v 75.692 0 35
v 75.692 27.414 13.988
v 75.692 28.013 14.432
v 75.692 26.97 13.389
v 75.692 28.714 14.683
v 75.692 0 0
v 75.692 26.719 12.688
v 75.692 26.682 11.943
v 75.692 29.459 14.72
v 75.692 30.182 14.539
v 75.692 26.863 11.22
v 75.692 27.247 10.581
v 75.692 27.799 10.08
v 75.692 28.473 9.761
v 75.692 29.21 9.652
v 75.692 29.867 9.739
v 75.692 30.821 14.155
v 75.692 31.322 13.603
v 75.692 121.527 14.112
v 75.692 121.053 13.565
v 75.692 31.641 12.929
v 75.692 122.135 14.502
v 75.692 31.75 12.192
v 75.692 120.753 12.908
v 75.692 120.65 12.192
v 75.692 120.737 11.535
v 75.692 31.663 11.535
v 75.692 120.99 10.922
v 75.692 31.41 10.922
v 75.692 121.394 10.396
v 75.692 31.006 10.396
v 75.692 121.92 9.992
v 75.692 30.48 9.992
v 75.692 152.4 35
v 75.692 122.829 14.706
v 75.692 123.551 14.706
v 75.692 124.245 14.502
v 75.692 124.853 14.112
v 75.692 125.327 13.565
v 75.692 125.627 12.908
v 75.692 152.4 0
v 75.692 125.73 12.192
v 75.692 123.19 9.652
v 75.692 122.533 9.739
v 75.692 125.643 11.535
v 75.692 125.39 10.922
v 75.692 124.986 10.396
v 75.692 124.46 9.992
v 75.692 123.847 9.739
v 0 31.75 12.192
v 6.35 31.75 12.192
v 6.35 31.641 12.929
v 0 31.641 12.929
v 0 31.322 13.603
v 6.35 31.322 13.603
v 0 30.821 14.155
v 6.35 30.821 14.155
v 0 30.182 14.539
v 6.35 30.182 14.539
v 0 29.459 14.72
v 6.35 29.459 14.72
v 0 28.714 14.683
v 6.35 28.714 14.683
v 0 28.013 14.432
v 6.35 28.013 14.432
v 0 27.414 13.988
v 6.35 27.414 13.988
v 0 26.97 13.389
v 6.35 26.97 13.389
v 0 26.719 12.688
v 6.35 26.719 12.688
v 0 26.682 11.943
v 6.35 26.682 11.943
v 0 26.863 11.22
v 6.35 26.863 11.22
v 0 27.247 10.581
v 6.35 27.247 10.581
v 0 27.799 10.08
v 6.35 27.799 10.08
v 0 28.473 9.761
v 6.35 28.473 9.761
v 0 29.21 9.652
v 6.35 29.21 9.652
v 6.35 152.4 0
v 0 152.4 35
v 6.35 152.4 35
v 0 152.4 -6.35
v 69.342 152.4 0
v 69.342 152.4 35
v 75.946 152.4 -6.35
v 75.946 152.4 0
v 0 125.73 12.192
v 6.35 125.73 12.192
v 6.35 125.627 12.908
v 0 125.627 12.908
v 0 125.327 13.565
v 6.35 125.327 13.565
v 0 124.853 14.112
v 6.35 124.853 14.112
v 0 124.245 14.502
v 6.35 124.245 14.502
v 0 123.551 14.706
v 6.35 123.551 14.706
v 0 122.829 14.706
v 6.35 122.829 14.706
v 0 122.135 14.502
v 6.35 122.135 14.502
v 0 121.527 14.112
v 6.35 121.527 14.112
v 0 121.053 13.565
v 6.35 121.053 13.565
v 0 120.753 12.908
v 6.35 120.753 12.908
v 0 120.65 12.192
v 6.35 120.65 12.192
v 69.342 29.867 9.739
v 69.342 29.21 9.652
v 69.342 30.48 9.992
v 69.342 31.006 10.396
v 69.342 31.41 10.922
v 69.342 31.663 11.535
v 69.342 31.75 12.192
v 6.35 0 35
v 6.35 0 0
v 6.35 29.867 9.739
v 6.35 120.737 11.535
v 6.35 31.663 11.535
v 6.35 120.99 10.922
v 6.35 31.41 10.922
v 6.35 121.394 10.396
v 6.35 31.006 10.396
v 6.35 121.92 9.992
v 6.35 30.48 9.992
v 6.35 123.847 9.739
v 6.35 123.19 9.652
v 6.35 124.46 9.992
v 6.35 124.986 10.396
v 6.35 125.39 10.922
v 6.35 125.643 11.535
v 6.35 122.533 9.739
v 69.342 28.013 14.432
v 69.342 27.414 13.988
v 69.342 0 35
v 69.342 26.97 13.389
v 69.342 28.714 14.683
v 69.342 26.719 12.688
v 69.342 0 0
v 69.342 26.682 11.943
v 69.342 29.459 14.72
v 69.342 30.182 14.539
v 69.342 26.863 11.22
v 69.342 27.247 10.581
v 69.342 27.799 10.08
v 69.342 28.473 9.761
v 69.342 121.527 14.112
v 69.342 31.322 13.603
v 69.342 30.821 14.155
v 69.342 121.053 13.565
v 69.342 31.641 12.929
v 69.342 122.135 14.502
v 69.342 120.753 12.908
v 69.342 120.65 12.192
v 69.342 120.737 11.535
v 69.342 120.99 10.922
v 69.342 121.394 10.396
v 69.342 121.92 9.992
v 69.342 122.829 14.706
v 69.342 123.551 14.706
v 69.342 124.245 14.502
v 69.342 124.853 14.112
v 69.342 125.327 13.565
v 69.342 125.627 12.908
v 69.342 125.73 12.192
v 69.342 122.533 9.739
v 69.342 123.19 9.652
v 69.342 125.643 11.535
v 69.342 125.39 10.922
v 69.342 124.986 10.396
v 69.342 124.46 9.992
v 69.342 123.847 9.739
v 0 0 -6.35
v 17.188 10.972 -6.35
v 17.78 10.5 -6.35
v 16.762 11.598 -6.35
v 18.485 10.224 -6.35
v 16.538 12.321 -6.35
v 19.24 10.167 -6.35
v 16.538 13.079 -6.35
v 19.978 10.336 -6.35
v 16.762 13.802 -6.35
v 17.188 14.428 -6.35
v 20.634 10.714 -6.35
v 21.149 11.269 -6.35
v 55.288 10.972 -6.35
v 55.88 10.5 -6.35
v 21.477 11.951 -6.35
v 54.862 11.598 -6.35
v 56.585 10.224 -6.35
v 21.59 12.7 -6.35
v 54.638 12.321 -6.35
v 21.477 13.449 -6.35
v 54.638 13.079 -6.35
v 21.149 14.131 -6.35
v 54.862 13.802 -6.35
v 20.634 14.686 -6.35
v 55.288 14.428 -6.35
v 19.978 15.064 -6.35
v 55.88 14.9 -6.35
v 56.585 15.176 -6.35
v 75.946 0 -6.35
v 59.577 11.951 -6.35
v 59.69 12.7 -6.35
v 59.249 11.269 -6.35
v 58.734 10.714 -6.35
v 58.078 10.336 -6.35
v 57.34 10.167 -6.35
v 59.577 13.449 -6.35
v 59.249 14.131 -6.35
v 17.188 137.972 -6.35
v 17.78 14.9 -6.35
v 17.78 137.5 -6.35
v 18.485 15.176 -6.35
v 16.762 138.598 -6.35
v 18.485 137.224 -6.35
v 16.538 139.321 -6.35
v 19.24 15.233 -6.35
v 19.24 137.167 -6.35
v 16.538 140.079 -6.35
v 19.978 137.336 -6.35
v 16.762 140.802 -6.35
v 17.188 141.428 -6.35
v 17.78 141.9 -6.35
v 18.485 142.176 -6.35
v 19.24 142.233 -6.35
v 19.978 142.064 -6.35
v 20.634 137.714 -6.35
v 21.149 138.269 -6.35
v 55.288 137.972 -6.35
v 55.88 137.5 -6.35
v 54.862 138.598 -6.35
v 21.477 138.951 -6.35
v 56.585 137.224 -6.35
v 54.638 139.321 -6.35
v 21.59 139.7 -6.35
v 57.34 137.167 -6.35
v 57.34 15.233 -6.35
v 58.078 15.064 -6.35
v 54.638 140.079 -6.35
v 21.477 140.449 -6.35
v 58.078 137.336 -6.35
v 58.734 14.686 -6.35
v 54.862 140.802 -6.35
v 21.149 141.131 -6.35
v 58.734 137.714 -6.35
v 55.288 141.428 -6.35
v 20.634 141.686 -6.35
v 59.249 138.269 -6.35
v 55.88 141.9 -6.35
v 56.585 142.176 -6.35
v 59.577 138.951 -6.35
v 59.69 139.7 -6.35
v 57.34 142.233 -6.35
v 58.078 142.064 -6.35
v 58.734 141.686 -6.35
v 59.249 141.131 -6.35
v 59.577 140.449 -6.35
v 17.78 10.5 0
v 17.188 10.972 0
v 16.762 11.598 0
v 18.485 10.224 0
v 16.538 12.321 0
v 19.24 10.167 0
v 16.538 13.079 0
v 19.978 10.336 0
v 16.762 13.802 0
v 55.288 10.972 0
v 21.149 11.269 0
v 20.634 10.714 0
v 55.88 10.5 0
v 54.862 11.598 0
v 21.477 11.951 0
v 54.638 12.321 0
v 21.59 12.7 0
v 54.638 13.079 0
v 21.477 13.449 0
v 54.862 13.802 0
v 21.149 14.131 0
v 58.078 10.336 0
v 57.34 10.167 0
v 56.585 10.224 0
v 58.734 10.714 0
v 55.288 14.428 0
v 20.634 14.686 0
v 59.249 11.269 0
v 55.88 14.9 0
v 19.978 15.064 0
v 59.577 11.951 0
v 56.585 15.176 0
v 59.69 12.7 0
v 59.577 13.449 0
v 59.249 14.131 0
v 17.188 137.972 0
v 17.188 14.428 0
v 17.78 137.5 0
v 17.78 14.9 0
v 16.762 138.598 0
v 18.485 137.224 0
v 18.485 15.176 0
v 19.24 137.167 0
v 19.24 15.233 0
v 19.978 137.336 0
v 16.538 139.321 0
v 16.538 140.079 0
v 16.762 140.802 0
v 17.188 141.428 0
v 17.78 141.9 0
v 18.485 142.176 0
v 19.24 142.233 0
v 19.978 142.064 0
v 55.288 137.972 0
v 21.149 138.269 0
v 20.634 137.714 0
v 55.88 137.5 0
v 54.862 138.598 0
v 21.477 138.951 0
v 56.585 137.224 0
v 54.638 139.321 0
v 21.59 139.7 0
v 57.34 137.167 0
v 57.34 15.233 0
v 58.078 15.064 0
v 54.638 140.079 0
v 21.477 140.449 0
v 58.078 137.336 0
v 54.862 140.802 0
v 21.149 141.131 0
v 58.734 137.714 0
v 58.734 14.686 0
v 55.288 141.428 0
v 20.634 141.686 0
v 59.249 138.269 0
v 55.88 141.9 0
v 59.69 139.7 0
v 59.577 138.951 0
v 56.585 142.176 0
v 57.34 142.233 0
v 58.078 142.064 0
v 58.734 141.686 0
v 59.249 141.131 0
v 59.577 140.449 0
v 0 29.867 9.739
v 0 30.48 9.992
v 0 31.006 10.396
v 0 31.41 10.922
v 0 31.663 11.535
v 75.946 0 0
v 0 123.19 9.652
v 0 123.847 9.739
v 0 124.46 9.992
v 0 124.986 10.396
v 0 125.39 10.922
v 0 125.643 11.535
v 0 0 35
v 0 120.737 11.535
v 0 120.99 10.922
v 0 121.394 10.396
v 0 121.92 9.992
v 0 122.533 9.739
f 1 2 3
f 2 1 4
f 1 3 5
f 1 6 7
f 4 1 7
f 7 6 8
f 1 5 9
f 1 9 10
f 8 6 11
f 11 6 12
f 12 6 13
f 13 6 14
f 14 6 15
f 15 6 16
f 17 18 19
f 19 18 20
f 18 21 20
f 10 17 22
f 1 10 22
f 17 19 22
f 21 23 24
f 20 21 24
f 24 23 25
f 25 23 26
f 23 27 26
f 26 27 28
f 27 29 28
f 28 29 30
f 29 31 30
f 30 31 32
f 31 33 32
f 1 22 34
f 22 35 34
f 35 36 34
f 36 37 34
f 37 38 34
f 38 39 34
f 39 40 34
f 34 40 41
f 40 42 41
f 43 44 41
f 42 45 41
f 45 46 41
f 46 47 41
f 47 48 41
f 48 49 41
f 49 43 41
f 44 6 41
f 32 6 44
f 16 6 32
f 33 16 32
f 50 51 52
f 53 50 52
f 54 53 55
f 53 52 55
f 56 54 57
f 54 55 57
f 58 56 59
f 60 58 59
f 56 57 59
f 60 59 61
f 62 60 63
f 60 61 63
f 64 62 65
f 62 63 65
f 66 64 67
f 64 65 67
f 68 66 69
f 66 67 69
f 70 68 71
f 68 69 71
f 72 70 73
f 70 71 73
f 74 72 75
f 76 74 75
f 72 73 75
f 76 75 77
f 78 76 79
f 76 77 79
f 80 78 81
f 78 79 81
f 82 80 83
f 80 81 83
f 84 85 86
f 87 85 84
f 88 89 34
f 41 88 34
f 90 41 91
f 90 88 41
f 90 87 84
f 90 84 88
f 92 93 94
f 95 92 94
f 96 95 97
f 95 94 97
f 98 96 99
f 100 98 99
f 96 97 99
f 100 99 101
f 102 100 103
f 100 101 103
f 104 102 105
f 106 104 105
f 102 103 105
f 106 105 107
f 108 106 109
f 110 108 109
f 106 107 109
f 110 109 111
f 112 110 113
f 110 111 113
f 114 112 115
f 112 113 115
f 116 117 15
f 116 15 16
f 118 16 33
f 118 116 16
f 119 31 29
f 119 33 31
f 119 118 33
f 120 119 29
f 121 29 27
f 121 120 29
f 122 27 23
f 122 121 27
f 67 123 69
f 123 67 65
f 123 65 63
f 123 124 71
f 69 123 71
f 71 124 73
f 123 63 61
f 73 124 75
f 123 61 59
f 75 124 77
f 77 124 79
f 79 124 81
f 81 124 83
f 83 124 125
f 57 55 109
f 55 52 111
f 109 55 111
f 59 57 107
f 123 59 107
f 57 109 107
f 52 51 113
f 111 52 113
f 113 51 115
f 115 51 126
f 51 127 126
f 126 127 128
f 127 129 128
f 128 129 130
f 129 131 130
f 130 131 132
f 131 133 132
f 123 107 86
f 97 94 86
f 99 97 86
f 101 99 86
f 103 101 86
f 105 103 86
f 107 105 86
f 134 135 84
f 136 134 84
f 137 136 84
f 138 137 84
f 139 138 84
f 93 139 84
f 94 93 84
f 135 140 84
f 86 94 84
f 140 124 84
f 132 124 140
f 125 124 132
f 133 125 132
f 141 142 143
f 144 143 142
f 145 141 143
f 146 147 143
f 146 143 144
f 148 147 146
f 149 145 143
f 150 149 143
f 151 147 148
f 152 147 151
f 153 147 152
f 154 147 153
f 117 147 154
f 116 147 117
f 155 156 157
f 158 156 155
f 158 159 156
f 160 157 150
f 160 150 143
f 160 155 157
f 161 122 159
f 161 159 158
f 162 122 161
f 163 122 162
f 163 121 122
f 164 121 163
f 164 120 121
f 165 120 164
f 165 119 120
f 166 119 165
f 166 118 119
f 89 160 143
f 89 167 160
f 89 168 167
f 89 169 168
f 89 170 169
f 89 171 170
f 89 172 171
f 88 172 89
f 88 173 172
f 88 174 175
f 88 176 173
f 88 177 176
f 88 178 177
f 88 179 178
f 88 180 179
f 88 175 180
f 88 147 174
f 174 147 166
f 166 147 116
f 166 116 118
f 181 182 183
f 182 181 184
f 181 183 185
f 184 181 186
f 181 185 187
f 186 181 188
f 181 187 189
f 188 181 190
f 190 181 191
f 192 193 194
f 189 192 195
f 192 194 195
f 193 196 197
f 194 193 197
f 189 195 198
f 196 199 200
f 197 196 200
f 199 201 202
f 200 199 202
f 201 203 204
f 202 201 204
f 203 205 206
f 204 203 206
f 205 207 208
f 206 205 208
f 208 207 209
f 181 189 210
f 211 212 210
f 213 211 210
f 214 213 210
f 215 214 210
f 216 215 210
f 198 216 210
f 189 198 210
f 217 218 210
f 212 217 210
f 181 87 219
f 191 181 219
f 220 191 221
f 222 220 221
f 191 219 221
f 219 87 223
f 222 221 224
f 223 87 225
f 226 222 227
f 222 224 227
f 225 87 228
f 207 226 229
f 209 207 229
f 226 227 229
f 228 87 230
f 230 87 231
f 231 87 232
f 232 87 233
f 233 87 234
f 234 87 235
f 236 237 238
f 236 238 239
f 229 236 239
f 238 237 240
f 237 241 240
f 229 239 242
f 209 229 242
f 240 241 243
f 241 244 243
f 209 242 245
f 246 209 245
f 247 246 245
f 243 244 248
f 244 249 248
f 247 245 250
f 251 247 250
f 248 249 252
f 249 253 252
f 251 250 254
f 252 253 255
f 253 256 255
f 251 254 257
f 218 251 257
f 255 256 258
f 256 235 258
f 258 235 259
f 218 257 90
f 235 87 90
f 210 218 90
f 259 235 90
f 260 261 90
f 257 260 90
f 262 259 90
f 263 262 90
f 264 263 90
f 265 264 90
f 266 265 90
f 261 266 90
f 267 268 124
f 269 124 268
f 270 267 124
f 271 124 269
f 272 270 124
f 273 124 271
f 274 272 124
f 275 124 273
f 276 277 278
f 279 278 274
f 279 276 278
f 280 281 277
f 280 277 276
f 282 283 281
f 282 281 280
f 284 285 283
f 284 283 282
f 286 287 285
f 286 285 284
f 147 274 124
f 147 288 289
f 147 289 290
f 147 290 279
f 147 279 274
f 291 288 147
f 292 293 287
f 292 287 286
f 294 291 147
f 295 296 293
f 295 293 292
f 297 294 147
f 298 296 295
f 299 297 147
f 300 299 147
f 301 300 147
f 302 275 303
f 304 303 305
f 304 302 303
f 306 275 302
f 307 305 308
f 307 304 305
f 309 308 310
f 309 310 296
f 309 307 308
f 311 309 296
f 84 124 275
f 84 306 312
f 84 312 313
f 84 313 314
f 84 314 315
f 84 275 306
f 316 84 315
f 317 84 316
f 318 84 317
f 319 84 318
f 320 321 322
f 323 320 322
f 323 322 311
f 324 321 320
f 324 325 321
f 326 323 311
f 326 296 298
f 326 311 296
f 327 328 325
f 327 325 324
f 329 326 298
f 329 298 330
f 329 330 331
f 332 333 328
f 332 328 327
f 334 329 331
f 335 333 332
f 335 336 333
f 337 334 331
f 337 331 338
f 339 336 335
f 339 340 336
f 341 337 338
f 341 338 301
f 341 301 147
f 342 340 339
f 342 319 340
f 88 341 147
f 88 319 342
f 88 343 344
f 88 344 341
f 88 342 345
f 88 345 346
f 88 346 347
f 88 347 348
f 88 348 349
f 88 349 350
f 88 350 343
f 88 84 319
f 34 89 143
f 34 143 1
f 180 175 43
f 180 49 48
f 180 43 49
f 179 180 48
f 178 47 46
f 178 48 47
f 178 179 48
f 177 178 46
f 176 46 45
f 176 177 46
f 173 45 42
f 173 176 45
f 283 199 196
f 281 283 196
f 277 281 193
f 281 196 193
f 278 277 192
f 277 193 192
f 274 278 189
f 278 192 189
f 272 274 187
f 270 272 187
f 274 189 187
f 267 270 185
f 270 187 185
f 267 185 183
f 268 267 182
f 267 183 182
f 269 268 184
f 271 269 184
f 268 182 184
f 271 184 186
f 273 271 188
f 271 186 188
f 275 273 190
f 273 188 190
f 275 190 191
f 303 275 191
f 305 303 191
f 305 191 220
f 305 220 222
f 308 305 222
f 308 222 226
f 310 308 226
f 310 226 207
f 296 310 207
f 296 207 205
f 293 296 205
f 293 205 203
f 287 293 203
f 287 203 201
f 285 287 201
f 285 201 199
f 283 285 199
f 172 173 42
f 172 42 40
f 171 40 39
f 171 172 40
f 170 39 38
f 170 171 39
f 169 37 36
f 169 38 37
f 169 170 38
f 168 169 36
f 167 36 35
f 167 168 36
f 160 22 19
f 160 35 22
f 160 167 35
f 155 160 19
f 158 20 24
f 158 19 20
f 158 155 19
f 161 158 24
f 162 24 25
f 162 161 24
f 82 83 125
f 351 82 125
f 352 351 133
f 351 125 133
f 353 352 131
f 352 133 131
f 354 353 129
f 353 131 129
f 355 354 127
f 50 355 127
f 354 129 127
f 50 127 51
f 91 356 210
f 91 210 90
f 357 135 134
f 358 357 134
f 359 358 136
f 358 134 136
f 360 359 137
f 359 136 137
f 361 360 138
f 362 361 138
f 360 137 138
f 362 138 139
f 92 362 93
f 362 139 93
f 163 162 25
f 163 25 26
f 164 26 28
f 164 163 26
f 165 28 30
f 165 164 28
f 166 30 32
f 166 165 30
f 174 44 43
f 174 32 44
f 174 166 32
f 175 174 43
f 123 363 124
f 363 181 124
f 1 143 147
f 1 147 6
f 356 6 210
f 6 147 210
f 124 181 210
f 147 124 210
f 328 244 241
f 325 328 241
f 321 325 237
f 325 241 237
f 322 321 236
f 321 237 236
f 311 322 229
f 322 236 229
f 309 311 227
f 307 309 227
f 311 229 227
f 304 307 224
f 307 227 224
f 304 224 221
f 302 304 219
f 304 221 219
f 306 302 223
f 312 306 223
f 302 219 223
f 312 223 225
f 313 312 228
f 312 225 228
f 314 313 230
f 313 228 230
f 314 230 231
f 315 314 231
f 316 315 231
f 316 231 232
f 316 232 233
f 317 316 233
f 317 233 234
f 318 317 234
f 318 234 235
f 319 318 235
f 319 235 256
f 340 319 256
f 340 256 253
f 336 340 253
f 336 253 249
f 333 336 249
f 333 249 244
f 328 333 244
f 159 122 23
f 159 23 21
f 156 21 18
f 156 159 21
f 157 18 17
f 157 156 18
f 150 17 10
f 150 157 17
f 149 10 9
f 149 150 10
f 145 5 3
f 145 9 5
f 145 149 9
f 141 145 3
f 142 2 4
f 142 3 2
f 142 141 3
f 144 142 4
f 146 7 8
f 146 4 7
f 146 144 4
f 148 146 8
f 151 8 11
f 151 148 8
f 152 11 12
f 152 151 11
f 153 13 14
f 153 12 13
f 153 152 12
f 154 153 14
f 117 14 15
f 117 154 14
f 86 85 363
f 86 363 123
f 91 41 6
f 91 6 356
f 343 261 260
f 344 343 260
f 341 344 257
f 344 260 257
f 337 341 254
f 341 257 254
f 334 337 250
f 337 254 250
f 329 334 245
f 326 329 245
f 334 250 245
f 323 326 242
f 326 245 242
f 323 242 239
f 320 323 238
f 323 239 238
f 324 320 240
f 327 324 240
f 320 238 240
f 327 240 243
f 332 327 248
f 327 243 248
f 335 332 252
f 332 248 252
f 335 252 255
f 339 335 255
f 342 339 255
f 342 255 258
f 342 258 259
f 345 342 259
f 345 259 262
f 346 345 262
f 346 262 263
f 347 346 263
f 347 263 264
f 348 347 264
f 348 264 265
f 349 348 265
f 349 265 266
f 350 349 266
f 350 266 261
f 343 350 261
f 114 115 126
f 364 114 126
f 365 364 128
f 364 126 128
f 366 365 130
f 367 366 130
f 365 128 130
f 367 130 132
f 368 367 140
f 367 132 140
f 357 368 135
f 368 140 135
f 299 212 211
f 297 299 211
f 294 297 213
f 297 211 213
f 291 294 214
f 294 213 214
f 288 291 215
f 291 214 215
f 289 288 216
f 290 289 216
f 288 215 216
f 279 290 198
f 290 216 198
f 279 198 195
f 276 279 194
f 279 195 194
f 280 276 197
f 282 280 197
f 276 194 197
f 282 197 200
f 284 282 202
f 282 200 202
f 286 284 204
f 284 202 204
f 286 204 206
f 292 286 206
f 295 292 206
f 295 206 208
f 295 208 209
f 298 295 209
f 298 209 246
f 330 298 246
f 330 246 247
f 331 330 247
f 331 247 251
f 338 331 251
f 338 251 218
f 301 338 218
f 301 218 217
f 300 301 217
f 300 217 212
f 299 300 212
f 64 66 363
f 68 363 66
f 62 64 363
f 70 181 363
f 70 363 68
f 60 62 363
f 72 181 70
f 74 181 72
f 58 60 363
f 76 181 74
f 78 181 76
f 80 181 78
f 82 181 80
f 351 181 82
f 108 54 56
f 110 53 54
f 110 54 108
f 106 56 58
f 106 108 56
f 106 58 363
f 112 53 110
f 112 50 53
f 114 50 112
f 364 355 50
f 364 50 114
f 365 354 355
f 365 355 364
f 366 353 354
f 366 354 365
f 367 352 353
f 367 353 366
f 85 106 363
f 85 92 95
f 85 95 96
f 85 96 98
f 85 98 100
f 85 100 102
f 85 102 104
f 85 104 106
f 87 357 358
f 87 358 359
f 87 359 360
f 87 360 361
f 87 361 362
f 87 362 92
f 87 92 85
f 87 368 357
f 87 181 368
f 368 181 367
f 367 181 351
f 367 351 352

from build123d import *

# Parameters (mm, degrees)
F0_W          = 75.946
F0_H          = 152.4
F2_DEPTH      = 6.35
F1_W          = 6.35
F1_H          = 152.4
F3_DEPTH      = 35
F4_R          = 2.54
F5_DEPTH      = 41.351
F7_DEPTH      = 6.351
F7_DEPTH_BACK = 69.597


with BuildPart() as f2:
    # F0 (on Top) → F2 (new body)
    with BuildSketch(Plane.XY):
        with Locations((37.973, 76.2)):
            Rectangle(F0_W, F0_H)
    extrude(amount=-F2_DEPTH)

    # F1 (on face) → F3 (join)
    with BuildSketch(Plane.XY):
        with Locations((3.175, 76.2)):
            Rectangle(F1_W, F1_H)
        with Locations((72.517, 76.2)):
            Rectangle(F1_W, F1_H)
    extrude(amount=F3_DEPTH)

    # F4 (on face) → F5 (cut, through all)
    with BuildSketch(Plane(origin=(0, 0, -6.35), x_dir=(1, 0, 0), z_dir=(0, 0, -1))):
        with Locations((57.15, -12.7)):
            Circle(F4_R)
        with Locations((19.05, -12.7)):
            Circle(F4_R)
        with Locations((19.05, -139.7)):
            Circle(F4_R)
        with Locations((57.15, -139.7)):
            Circle(F4_R)
    extrude(amount=-F5_DEPTH, mode=Mode.SUBTRACT)

    # F6 (on face) → F7 (cut, two sides)
    with BuildSketch(Plane.YZ.offset(6.35)) as f7_sk:
        with BuildLine():
            ThreePointArc((31.75, 12.192), (27.4139487758, 13.9880512242), (29.21, 9.652))
            Line((29.21, 9.652), (29.21, 12.192))
            Line((29.21, 12.192), (31.75, 12.192))
        make_face()
        with BuildLine():
            ThreePointArc((125.73, 12.192), (123.19, 14.732), (120.65, 12.192))
            Line((120.65, 12.192), (123.19, 12.192))
            Line((123.19, 12.192), (123.19, 9.652))
            ThreePointArc((123.19, 9.652), (124.9860512242, 10.3959487758), (125.73, 12.192))
        make_face()
        with BuildLine():
            Line((123.19, 12.192), (120.65, 12.192))
            ThreePointArc((120.65, 12.192), (121.3939487758, 10.3959487758), (123.19, 9.652))
            Line((123.19, 9.652), (123.19, 12.192))
        make_face()
        with BuildLine():
            Line((29.21, 12.192), (29.21, 9.652))
            ThreePointArc((29.21, 9.652), (31.0060512242, 10.3959487758), (31.75, 12.192))
            Line((31.75, 12.192), (29.21, 12.192))
        make_face()
    extrude(amount=-F7_DEPTH, mode=Mode.SUBTRACT)
    extrude(f7_sk.sketch, amount=F7_DEPTH_BACK, mode=Mode.SUBTRACT)


solid = f2.part
